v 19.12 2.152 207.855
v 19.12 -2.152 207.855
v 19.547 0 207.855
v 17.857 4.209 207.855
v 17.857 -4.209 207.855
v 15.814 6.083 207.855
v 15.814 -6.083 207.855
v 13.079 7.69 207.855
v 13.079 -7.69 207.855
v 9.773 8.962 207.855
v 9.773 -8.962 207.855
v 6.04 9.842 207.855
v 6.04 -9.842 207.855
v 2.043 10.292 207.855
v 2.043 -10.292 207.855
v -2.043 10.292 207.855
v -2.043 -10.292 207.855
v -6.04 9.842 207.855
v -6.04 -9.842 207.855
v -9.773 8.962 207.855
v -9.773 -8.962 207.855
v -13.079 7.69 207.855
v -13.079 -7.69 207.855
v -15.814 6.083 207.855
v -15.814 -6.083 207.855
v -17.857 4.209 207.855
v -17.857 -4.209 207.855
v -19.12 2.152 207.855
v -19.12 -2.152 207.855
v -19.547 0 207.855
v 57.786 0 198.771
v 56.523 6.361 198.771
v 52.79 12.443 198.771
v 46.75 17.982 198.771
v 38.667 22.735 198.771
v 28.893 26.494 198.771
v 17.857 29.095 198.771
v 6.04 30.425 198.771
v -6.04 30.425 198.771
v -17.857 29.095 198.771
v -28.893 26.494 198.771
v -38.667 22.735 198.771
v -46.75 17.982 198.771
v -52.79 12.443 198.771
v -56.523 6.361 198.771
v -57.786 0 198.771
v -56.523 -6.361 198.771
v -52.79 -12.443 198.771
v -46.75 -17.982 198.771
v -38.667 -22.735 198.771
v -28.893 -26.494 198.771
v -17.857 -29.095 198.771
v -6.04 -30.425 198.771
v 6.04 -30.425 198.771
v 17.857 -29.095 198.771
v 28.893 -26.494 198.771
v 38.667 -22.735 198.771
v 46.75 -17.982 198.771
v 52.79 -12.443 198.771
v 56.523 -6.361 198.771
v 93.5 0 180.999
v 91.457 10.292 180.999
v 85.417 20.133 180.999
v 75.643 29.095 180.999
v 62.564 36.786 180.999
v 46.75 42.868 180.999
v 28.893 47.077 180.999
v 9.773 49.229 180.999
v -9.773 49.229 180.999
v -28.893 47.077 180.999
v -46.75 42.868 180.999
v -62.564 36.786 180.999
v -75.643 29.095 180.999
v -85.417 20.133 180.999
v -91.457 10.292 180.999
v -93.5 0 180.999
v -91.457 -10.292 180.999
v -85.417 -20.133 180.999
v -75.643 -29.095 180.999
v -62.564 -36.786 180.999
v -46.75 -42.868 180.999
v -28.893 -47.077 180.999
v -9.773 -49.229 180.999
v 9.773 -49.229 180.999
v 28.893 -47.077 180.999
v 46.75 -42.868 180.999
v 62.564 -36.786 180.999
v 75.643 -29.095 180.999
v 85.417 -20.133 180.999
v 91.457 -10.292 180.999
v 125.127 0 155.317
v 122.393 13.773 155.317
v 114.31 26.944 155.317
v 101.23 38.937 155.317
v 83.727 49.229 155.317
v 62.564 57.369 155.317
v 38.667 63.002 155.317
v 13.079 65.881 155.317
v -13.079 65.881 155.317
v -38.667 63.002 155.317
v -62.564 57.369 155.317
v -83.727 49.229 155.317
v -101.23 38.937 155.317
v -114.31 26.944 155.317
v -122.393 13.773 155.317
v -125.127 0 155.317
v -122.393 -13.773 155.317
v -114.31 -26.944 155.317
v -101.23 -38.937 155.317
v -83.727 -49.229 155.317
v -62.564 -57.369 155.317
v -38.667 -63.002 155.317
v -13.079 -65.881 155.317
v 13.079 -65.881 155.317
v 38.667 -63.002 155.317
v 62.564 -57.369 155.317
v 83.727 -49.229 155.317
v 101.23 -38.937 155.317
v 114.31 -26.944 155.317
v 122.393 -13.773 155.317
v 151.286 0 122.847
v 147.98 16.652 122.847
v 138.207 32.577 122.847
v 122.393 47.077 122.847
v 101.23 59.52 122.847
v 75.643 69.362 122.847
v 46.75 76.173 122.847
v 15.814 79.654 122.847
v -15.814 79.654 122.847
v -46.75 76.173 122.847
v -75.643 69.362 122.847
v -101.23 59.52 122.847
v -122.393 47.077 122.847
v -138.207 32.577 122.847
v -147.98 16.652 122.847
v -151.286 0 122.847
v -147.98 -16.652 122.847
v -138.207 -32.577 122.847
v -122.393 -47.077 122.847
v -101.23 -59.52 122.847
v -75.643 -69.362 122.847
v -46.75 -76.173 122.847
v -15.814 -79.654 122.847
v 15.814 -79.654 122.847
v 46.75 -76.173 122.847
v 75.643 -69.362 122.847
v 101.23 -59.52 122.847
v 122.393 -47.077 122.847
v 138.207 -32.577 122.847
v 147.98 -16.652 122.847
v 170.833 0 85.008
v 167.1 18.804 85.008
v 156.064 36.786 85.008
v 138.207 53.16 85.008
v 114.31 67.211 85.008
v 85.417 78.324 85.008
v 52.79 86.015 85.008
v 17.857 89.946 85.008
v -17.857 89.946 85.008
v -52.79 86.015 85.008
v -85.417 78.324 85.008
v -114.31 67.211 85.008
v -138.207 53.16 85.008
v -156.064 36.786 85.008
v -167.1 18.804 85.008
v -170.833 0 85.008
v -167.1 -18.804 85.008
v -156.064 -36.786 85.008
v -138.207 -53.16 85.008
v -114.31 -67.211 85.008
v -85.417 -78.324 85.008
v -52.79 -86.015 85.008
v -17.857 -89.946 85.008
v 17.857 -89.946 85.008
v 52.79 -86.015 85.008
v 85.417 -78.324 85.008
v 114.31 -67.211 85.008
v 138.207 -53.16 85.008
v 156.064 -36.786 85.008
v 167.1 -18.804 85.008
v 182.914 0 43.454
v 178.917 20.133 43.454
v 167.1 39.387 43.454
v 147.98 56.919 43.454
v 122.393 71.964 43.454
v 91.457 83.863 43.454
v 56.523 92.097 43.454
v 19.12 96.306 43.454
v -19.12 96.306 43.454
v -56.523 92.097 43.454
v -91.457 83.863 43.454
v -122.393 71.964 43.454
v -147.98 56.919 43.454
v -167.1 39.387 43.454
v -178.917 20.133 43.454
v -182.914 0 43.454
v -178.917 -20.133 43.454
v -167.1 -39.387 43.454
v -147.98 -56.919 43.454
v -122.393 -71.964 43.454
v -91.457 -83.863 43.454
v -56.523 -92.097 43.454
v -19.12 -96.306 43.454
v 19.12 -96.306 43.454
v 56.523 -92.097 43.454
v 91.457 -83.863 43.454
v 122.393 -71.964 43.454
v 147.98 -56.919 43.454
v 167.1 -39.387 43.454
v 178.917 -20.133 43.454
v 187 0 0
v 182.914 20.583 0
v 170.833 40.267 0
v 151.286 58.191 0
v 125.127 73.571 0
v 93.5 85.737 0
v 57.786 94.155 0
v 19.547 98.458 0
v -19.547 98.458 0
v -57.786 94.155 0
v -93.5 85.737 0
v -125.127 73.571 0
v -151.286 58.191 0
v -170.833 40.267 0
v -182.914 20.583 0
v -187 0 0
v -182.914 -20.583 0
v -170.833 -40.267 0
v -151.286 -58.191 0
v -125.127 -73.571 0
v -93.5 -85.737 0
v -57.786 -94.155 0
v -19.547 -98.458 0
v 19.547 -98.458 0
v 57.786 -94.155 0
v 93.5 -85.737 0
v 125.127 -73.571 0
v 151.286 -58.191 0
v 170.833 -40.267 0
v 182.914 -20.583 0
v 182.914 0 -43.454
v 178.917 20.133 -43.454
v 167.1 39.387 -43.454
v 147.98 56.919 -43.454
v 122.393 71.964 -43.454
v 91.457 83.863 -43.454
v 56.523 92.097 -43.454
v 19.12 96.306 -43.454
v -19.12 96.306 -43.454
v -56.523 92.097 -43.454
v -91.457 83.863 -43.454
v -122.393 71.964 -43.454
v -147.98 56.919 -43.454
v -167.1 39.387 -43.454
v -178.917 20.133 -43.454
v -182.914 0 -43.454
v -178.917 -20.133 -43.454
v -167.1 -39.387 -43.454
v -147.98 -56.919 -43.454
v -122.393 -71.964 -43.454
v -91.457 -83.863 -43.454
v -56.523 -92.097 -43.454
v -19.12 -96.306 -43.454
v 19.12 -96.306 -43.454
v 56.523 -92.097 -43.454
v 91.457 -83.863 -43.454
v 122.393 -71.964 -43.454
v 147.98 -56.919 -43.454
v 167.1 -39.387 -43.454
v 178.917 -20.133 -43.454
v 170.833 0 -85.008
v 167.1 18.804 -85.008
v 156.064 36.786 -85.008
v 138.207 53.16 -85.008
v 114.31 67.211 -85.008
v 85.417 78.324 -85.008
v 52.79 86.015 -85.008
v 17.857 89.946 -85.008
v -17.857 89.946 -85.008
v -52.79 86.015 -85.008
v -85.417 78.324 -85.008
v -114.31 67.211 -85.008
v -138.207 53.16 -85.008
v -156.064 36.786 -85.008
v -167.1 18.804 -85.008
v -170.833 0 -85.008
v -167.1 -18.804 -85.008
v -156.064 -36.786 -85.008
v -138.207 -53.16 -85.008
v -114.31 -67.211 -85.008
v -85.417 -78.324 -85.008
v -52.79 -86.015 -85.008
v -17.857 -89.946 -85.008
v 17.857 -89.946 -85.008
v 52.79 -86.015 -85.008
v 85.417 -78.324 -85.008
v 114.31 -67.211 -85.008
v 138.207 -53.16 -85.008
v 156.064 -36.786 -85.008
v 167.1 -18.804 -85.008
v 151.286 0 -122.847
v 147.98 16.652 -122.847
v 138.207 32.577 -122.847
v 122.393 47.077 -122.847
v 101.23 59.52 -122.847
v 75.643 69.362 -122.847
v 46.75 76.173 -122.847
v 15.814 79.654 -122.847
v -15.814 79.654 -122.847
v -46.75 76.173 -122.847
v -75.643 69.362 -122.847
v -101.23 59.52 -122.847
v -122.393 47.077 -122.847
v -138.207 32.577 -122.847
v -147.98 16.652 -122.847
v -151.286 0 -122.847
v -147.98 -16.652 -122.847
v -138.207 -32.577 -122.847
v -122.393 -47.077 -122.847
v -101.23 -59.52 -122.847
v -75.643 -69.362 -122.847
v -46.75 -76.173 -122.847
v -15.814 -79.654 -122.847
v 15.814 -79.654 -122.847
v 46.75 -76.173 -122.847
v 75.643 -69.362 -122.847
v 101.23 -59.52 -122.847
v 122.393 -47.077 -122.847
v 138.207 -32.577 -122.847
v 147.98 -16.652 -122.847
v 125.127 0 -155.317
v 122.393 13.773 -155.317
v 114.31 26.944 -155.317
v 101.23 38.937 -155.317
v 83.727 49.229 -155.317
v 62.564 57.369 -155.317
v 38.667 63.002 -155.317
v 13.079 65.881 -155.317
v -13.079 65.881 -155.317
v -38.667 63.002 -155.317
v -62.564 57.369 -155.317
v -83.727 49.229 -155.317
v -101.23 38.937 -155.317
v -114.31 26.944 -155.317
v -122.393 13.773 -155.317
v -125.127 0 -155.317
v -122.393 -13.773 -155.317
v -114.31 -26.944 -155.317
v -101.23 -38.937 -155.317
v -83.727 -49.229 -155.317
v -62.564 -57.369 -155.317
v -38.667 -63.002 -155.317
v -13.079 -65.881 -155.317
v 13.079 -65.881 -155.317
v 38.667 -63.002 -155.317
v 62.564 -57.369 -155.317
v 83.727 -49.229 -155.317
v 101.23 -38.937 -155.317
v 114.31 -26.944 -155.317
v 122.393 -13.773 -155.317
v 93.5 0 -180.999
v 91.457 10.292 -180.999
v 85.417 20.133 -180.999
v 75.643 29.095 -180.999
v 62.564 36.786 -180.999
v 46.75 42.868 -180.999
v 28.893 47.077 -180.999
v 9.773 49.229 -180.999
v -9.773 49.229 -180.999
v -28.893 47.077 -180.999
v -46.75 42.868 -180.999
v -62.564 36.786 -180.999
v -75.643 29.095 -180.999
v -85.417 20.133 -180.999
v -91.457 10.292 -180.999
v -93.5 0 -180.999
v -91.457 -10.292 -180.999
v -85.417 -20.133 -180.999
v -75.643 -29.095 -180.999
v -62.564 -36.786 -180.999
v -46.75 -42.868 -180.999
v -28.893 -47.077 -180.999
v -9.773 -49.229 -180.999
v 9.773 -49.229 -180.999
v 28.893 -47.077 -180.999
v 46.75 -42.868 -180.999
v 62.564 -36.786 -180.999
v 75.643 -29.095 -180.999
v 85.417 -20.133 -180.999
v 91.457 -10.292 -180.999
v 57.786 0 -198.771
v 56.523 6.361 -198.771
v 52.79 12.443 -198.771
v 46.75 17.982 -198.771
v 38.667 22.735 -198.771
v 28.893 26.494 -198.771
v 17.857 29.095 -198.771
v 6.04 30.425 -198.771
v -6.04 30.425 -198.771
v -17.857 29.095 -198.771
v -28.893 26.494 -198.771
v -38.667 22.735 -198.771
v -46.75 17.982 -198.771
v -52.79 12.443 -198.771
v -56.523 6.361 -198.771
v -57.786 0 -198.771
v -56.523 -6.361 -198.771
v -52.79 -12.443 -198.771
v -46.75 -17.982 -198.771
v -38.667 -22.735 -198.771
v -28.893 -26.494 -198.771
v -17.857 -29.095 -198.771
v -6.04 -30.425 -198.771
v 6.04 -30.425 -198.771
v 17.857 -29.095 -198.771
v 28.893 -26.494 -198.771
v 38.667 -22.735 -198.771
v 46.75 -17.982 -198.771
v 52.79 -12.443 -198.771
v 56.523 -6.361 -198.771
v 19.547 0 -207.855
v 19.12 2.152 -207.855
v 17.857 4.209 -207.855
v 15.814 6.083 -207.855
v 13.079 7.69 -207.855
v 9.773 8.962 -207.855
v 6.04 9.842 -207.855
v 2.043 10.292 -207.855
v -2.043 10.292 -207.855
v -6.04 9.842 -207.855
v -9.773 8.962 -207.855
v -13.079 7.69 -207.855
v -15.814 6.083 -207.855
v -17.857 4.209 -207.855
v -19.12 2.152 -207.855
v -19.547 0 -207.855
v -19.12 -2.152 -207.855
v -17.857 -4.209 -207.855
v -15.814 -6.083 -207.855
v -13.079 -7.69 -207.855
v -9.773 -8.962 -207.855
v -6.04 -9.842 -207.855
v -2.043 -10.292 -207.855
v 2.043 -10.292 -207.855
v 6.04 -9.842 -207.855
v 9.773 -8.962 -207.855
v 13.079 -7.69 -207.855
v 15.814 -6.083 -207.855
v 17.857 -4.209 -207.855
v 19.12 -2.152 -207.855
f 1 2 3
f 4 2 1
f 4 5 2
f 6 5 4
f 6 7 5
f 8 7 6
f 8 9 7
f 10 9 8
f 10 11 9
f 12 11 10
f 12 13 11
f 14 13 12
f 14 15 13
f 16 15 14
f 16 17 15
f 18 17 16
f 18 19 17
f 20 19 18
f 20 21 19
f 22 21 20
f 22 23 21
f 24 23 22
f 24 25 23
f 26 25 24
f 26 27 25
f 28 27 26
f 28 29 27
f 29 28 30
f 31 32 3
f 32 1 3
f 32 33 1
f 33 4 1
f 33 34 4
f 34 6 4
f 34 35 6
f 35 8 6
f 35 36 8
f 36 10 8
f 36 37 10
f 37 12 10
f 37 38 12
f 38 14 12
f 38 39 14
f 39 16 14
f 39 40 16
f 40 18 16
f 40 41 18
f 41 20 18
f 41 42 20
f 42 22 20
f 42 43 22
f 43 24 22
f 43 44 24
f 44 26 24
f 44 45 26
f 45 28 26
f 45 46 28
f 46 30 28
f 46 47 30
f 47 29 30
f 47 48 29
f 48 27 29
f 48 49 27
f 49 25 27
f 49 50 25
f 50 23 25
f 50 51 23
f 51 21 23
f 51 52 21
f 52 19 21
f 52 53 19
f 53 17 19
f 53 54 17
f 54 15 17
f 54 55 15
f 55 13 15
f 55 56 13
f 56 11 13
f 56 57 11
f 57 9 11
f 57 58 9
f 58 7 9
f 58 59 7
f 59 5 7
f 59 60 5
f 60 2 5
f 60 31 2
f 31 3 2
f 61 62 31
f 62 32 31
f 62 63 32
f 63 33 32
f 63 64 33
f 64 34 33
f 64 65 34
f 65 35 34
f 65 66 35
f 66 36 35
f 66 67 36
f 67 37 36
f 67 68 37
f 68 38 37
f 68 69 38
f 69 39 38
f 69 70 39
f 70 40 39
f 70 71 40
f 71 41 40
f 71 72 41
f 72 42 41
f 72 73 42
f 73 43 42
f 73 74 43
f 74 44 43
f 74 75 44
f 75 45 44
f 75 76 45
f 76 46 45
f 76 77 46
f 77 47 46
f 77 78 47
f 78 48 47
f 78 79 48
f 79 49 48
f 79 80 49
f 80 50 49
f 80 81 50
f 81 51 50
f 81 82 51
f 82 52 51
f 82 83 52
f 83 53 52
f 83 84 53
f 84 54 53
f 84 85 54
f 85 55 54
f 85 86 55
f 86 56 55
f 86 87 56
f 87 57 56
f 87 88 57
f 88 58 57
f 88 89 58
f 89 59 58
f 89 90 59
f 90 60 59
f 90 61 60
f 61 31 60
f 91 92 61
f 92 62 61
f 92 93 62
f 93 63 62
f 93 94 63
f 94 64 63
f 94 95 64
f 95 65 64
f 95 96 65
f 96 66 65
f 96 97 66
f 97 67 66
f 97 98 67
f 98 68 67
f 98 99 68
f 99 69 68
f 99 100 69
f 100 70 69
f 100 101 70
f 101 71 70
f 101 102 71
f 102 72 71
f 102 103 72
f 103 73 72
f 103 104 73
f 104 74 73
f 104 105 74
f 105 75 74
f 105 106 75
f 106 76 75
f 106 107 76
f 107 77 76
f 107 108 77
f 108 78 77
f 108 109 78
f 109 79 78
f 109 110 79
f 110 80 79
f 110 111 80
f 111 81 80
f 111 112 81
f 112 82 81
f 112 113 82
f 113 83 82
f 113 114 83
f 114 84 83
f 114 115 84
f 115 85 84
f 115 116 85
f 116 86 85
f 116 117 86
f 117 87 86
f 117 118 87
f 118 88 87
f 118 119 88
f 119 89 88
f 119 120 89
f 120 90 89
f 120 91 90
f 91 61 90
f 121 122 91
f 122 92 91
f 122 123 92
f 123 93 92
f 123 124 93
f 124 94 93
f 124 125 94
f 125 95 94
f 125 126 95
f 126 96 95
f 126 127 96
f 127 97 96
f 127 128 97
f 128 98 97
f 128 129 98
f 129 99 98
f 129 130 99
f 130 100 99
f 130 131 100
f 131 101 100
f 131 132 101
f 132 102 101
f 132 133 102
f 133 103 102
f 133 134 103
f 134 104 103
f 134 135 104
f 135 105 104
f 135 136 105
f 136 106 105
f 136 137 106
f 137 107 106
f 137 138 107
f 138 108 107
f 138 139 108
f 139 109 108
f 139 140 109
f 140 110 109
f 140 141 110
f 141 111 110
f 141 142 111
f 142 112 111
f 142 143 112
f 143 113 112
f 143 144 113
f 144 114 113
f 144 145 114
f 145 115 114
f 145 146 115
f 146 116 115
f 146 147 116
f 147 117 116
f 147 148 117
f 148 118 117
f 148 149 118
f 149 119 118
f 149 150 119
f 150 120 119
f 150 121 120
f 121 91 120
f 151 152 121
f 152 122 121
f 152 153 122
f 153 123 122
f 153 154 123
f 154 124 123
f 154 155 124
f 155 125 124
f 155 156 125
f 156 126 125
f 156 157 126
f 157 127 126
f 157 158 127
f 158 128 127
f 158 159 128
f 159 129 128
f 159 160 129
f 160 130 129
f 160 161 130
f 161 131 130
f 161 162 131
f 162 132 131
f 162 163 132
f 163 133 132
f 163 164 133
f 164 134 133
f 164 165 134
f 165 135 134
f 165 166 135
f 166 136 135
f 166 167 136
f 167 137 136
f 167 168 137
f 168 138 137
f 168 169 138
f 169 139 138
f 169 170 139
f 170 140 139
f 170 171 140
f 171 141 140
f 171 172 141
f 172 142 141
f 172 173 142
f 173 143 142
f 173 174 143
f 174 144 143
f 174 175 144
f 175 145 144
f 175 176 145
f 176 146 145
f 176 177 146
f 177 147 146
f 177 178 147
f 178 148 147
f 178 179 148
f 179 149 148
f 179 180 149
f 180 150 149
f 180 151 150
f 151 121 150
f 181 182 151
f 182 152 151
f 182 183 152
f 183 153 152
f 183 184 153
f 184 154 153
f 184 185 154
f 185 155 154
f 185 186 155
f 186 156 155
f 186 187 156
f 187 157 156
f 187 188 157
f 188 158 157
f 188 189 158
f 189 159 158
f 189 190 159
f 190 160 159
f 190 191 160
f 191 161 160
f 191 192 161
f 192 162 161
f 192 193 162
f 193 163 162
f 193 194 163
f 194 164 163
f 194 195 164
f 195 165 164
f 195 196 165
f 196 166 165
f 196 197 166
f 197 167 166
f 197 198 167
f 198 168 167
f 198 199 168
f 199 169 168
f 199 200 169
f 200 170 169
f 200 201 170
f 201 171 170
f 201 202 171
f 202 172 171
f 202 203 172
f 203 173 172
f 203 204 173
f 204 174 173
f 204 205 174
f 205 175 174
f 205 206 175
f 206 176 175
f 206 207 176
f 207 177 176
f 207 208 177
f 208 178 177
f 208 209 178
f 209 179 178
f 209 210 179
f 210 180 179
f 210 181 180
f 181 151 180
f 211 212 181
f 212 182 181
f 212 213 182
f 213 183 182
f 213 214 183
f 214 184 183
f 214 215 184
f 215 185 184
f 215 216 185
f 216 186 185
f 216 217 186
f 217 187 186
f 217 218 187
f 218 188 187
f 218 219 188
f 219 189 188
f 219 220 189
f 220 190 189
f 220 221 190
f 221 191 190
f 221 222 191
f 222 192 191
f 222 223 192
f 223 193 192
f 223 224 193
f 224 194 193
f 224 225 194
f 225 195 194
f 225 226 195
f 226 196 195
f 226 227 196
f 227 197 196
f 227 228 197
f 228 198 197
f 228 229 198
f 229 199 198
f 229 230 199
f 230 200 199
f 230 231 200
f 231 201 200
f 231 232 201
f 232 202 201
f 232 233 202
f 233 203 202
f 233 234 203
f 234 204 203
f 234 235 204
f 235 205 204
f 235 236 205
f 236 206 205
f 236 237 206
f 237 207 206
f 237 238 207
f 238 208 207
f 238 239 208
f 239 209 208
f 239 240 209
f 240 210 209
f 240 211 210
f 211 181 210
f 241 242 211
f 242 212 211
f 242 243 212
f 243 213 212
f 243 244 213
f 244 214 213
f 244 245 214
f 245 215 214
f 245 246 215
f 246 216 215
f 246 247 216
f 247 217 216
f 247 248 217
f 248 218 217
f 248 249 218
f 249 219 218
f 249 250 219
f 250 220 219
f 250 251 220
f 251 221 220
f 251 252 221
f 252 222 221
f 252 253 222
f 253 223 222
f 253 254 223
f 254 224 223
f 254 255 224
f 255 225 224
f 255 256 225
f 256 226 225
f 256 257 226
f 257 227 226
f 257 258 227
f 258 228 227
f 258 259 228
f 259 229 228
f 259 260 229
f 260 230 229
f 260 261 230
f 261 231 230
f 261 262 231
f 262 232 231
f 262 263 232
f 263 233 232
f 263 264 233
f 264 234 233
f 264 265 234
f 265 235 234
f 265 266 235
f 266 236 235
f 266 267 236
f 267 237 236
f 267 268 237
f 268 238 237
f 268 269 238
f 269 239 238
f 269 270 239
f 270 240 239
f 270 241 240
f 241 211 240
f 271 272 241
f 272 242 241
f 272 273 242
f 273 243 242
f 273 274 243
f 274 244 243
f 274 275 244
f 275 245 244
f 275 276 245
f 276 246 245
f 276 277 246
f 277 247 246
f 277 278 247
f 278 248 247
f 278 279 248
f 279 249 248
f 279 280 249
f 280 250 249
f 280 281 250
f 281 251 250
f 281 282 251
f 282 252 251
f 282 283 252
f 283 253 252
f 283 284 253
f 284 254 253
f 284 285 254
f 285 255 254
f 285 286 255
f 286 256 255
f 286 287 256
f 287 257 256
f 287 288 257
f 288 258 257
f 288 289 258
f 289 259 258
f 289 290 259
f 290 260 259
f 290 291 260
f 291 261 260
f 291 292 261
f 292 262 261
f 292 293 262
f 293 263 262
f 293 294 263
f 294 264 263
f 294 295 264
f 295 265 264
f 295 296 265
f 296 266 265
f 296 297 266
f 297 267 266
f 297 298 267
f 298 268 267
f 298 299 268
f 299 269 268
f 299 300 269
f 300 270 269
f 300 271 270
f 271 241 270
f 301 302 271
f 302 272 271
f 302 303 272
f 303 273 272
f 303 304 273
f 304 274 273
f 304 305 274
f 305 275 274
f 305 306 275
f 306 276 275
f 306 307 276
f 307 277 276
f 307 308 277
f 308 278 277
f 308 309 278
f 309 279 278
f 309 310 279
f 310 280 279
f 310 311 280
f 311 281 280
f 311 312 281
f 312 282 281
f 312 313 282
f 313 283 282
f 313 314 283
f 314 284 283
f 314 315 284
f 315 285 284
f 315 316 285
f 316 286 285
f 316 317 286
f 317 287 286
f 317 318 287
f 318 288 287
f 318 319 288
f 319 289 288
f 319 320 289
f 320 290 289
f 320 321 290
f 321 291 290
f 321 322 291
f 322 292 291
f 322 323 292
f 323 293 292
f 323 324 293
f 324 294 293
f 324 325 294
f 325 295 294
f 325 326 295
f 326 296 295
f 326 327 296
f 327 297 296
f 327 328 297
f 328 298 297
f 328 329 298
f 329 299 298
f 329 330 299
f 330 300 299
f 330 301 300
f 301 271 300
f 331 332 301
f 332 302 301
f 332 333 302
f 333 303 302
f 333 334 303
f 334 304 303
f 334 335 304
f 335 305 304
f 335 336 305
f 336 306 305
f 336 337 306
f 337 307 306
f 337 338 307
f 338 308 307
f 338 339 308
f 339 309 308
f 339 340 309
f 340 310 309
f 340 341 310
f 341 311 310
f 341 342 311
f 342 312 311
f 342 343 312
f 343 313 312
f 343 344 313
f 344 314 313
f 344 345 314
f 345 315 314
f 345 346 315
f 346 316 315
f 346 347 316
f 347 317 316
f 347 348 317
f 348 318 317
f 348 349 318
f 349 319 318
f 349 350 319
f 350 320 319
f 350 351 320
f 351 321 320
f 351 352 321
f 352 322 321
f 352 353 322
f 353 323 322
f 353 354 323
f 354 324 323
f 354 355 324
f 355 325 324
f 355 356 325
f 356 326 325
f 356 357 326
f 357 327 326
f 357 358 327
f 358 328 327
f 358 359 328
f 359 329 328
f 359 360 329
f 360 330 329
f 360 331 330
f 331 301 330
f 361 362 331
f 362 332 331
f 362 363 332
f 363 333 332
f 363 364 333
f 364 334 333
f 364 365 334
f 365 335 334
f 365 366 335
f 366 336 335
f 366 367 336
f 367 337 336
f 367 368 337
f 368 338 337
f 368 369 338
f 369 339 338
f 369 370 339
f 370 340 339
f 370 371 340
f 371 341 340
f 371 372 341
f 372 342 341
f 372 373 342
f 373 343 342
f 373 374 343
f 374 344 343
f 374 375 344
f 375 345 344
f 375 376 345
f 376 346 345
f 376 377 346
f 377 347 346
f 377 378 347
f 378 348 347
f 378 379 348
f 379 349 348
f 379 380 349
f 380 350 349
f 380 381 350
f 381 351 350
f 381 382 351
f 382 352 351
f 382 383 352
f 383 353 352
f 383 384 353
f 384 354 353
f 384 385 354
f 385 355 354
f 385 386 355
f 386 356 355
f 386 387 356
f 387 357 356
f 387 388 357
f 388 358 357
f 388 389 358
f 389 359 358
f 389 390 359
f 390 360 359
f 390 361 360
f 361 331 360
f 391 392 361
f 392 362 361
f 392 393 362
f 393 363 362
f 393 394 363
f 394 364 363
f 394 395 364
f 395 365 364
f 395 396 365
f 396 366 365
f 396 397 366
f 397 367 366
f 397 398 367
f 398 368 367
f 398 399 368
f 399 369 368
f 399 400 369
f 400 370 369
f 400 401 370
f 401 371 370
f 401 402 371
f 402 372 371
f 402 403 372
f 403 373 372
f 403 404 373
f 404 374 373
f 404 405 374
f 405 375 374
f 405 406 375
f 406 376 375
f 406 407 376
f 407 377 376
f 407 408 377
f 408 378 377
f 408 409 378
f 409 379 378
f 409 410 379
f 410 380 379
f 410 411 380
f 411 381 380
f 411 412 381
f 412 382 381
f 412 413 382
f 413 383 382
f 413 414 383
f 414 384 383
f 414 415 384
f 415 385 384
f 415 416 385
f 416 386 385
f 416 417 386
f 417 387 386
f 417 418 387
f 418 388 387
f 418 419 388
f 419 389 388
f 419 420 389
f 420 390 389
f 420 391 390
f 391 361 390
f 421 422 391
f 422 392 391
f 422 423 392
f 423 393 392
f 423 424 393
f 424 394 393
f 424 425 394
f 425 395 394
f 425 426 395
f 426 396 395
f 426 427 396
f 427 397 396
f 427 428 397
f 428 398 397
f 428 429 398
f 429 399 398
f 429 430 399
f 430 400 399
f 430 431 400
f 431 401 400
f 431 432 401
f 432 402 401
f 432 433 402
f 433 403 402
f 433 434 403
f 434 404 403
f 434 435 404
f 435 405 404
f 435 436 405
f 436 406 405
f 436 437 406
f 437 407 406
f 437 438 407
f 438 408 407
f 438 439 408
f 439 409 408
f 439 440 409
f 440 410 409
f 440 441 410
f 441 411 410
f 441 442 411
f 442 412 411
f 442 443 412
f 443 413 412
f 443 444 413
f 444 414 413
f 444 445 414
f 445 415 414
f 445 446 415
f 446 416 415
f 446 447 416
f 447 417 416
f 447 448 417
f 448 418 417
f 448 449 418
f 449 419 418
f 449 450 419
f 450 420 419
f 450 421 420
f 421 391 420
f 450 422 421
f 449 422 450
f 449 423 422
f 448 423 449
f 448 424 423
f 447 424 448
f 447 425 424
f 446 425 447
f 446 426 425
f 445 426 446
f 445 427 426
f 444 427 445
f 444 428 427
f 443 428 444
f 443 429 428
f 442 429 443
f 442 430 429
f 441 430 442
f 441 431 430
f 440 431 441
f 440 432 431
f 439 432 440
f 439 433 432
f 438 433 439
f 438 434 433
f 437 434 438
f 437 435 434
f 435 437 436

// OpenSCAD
// Generated by SolidPython 1.0.1 on 2020-07-29 00:46:53


scale(v = [17, 9, 19]) {
	sphere(r = 11);
}
/***********************************************
*********      SolidPython code:      **********
************************************************
 
# import packages: SolidPython
from solid import *
from solid.utils import *
from itertools import chain, combinations, permutations


class Resize:

    def __init__(self, scad_file):
        self.scad_file = scad_file
        #self.scad_file = import_scad(scad_file)
        # cone/cylinder param:
        self.r1 = 0
        self.r2 = 0
        self.h = 0
        # rectangular prism param:
        self.w = 0
        self.l = 0
        # ellipse param:
        self.r = 0

    # import OpenScad code (file name corresponds to shape)


    # classify shape + parameters
    def assign(self, param1, param2, param3):
        if self.scad_file == 'cone.scad':
            self.r1 = param1
            self.r2 = param2
            self.h = param3
        elif self.scad_file == 'cylinder.scad':
            self.r1 = param1
            self.r2 = param2
            self.h = param3
        elif self.scad_file == 'rectangularPrism.scad':
            self.h = param1
            self.l = param2
            self.w = param3
        else:
            self.r = param1
            self.h = param2

    # resize parameters
    def iterate(self):
        x = range(3, 20, 2)
        i = 1
        if self.scad_file == 'cone.scad':
            tempList = list(permutations(x, 2))
            for temp in tempList:
                param1 = temp[0]
                param2 = temp[1]
                filepath = 'produced_scad_files/' + 'cone' + str(param1) + '_' + str(param2) + '_' + '.scad'
                scad_render_to_file(cylinder(h=param1, r1=param2, r2=0), filepath)

        elif self.scad_file == 'cylinder.scad':
            tempList = list(permutations(x, 3))
            for temp in tempList:
                param1 = temp[0]
                param2 = temp[1]
                filepath = 'produced_scad_files/' + 'cylinder' + str(param1) + '_' + str(param2) + '_' + '.scad'
                scad_render_to_file(cylinder(h=param1, r1=param2, r2=param2), filepath)

        elif self.scad_file == 'rectangularPrism.scad':
            tempList = list(permutations(x, 3))
            for temp in tempList:
                param1 = temp[0]
                param2 = temp[1]
                param3 = temp[2]
                filepath = 'produced_scad_files/' + 'rectangularPrism' + str(param1) + '_' + str(param2) + '_' + str(
                    param3) + '.scad'
                scad_render_to_file(cube(size=(param1, param2, param3)), filepath)

        elif self.scad_file == 'ellipse.scad':
            tempList = list(permutations(x, 4))
            for temp in tempList:
                param1 = temp[0]
                param2 = temp[1]
                param3 = temp[2]
                param4 = temp[3]
                filepath = 'produced_scad_files/' + 'ellipse' + str(param1) + '_' + str(param2) + '_' + str(param3) + '_' + str(param4) + '.scad'
                scad_render_to_file(scale([param1, param2, param3])(sphere(r=param4)), filepath)

    def render_to_scadfile(self):
        scad_render_to_file(scad, 'example.scad') 
 
************************************************/
